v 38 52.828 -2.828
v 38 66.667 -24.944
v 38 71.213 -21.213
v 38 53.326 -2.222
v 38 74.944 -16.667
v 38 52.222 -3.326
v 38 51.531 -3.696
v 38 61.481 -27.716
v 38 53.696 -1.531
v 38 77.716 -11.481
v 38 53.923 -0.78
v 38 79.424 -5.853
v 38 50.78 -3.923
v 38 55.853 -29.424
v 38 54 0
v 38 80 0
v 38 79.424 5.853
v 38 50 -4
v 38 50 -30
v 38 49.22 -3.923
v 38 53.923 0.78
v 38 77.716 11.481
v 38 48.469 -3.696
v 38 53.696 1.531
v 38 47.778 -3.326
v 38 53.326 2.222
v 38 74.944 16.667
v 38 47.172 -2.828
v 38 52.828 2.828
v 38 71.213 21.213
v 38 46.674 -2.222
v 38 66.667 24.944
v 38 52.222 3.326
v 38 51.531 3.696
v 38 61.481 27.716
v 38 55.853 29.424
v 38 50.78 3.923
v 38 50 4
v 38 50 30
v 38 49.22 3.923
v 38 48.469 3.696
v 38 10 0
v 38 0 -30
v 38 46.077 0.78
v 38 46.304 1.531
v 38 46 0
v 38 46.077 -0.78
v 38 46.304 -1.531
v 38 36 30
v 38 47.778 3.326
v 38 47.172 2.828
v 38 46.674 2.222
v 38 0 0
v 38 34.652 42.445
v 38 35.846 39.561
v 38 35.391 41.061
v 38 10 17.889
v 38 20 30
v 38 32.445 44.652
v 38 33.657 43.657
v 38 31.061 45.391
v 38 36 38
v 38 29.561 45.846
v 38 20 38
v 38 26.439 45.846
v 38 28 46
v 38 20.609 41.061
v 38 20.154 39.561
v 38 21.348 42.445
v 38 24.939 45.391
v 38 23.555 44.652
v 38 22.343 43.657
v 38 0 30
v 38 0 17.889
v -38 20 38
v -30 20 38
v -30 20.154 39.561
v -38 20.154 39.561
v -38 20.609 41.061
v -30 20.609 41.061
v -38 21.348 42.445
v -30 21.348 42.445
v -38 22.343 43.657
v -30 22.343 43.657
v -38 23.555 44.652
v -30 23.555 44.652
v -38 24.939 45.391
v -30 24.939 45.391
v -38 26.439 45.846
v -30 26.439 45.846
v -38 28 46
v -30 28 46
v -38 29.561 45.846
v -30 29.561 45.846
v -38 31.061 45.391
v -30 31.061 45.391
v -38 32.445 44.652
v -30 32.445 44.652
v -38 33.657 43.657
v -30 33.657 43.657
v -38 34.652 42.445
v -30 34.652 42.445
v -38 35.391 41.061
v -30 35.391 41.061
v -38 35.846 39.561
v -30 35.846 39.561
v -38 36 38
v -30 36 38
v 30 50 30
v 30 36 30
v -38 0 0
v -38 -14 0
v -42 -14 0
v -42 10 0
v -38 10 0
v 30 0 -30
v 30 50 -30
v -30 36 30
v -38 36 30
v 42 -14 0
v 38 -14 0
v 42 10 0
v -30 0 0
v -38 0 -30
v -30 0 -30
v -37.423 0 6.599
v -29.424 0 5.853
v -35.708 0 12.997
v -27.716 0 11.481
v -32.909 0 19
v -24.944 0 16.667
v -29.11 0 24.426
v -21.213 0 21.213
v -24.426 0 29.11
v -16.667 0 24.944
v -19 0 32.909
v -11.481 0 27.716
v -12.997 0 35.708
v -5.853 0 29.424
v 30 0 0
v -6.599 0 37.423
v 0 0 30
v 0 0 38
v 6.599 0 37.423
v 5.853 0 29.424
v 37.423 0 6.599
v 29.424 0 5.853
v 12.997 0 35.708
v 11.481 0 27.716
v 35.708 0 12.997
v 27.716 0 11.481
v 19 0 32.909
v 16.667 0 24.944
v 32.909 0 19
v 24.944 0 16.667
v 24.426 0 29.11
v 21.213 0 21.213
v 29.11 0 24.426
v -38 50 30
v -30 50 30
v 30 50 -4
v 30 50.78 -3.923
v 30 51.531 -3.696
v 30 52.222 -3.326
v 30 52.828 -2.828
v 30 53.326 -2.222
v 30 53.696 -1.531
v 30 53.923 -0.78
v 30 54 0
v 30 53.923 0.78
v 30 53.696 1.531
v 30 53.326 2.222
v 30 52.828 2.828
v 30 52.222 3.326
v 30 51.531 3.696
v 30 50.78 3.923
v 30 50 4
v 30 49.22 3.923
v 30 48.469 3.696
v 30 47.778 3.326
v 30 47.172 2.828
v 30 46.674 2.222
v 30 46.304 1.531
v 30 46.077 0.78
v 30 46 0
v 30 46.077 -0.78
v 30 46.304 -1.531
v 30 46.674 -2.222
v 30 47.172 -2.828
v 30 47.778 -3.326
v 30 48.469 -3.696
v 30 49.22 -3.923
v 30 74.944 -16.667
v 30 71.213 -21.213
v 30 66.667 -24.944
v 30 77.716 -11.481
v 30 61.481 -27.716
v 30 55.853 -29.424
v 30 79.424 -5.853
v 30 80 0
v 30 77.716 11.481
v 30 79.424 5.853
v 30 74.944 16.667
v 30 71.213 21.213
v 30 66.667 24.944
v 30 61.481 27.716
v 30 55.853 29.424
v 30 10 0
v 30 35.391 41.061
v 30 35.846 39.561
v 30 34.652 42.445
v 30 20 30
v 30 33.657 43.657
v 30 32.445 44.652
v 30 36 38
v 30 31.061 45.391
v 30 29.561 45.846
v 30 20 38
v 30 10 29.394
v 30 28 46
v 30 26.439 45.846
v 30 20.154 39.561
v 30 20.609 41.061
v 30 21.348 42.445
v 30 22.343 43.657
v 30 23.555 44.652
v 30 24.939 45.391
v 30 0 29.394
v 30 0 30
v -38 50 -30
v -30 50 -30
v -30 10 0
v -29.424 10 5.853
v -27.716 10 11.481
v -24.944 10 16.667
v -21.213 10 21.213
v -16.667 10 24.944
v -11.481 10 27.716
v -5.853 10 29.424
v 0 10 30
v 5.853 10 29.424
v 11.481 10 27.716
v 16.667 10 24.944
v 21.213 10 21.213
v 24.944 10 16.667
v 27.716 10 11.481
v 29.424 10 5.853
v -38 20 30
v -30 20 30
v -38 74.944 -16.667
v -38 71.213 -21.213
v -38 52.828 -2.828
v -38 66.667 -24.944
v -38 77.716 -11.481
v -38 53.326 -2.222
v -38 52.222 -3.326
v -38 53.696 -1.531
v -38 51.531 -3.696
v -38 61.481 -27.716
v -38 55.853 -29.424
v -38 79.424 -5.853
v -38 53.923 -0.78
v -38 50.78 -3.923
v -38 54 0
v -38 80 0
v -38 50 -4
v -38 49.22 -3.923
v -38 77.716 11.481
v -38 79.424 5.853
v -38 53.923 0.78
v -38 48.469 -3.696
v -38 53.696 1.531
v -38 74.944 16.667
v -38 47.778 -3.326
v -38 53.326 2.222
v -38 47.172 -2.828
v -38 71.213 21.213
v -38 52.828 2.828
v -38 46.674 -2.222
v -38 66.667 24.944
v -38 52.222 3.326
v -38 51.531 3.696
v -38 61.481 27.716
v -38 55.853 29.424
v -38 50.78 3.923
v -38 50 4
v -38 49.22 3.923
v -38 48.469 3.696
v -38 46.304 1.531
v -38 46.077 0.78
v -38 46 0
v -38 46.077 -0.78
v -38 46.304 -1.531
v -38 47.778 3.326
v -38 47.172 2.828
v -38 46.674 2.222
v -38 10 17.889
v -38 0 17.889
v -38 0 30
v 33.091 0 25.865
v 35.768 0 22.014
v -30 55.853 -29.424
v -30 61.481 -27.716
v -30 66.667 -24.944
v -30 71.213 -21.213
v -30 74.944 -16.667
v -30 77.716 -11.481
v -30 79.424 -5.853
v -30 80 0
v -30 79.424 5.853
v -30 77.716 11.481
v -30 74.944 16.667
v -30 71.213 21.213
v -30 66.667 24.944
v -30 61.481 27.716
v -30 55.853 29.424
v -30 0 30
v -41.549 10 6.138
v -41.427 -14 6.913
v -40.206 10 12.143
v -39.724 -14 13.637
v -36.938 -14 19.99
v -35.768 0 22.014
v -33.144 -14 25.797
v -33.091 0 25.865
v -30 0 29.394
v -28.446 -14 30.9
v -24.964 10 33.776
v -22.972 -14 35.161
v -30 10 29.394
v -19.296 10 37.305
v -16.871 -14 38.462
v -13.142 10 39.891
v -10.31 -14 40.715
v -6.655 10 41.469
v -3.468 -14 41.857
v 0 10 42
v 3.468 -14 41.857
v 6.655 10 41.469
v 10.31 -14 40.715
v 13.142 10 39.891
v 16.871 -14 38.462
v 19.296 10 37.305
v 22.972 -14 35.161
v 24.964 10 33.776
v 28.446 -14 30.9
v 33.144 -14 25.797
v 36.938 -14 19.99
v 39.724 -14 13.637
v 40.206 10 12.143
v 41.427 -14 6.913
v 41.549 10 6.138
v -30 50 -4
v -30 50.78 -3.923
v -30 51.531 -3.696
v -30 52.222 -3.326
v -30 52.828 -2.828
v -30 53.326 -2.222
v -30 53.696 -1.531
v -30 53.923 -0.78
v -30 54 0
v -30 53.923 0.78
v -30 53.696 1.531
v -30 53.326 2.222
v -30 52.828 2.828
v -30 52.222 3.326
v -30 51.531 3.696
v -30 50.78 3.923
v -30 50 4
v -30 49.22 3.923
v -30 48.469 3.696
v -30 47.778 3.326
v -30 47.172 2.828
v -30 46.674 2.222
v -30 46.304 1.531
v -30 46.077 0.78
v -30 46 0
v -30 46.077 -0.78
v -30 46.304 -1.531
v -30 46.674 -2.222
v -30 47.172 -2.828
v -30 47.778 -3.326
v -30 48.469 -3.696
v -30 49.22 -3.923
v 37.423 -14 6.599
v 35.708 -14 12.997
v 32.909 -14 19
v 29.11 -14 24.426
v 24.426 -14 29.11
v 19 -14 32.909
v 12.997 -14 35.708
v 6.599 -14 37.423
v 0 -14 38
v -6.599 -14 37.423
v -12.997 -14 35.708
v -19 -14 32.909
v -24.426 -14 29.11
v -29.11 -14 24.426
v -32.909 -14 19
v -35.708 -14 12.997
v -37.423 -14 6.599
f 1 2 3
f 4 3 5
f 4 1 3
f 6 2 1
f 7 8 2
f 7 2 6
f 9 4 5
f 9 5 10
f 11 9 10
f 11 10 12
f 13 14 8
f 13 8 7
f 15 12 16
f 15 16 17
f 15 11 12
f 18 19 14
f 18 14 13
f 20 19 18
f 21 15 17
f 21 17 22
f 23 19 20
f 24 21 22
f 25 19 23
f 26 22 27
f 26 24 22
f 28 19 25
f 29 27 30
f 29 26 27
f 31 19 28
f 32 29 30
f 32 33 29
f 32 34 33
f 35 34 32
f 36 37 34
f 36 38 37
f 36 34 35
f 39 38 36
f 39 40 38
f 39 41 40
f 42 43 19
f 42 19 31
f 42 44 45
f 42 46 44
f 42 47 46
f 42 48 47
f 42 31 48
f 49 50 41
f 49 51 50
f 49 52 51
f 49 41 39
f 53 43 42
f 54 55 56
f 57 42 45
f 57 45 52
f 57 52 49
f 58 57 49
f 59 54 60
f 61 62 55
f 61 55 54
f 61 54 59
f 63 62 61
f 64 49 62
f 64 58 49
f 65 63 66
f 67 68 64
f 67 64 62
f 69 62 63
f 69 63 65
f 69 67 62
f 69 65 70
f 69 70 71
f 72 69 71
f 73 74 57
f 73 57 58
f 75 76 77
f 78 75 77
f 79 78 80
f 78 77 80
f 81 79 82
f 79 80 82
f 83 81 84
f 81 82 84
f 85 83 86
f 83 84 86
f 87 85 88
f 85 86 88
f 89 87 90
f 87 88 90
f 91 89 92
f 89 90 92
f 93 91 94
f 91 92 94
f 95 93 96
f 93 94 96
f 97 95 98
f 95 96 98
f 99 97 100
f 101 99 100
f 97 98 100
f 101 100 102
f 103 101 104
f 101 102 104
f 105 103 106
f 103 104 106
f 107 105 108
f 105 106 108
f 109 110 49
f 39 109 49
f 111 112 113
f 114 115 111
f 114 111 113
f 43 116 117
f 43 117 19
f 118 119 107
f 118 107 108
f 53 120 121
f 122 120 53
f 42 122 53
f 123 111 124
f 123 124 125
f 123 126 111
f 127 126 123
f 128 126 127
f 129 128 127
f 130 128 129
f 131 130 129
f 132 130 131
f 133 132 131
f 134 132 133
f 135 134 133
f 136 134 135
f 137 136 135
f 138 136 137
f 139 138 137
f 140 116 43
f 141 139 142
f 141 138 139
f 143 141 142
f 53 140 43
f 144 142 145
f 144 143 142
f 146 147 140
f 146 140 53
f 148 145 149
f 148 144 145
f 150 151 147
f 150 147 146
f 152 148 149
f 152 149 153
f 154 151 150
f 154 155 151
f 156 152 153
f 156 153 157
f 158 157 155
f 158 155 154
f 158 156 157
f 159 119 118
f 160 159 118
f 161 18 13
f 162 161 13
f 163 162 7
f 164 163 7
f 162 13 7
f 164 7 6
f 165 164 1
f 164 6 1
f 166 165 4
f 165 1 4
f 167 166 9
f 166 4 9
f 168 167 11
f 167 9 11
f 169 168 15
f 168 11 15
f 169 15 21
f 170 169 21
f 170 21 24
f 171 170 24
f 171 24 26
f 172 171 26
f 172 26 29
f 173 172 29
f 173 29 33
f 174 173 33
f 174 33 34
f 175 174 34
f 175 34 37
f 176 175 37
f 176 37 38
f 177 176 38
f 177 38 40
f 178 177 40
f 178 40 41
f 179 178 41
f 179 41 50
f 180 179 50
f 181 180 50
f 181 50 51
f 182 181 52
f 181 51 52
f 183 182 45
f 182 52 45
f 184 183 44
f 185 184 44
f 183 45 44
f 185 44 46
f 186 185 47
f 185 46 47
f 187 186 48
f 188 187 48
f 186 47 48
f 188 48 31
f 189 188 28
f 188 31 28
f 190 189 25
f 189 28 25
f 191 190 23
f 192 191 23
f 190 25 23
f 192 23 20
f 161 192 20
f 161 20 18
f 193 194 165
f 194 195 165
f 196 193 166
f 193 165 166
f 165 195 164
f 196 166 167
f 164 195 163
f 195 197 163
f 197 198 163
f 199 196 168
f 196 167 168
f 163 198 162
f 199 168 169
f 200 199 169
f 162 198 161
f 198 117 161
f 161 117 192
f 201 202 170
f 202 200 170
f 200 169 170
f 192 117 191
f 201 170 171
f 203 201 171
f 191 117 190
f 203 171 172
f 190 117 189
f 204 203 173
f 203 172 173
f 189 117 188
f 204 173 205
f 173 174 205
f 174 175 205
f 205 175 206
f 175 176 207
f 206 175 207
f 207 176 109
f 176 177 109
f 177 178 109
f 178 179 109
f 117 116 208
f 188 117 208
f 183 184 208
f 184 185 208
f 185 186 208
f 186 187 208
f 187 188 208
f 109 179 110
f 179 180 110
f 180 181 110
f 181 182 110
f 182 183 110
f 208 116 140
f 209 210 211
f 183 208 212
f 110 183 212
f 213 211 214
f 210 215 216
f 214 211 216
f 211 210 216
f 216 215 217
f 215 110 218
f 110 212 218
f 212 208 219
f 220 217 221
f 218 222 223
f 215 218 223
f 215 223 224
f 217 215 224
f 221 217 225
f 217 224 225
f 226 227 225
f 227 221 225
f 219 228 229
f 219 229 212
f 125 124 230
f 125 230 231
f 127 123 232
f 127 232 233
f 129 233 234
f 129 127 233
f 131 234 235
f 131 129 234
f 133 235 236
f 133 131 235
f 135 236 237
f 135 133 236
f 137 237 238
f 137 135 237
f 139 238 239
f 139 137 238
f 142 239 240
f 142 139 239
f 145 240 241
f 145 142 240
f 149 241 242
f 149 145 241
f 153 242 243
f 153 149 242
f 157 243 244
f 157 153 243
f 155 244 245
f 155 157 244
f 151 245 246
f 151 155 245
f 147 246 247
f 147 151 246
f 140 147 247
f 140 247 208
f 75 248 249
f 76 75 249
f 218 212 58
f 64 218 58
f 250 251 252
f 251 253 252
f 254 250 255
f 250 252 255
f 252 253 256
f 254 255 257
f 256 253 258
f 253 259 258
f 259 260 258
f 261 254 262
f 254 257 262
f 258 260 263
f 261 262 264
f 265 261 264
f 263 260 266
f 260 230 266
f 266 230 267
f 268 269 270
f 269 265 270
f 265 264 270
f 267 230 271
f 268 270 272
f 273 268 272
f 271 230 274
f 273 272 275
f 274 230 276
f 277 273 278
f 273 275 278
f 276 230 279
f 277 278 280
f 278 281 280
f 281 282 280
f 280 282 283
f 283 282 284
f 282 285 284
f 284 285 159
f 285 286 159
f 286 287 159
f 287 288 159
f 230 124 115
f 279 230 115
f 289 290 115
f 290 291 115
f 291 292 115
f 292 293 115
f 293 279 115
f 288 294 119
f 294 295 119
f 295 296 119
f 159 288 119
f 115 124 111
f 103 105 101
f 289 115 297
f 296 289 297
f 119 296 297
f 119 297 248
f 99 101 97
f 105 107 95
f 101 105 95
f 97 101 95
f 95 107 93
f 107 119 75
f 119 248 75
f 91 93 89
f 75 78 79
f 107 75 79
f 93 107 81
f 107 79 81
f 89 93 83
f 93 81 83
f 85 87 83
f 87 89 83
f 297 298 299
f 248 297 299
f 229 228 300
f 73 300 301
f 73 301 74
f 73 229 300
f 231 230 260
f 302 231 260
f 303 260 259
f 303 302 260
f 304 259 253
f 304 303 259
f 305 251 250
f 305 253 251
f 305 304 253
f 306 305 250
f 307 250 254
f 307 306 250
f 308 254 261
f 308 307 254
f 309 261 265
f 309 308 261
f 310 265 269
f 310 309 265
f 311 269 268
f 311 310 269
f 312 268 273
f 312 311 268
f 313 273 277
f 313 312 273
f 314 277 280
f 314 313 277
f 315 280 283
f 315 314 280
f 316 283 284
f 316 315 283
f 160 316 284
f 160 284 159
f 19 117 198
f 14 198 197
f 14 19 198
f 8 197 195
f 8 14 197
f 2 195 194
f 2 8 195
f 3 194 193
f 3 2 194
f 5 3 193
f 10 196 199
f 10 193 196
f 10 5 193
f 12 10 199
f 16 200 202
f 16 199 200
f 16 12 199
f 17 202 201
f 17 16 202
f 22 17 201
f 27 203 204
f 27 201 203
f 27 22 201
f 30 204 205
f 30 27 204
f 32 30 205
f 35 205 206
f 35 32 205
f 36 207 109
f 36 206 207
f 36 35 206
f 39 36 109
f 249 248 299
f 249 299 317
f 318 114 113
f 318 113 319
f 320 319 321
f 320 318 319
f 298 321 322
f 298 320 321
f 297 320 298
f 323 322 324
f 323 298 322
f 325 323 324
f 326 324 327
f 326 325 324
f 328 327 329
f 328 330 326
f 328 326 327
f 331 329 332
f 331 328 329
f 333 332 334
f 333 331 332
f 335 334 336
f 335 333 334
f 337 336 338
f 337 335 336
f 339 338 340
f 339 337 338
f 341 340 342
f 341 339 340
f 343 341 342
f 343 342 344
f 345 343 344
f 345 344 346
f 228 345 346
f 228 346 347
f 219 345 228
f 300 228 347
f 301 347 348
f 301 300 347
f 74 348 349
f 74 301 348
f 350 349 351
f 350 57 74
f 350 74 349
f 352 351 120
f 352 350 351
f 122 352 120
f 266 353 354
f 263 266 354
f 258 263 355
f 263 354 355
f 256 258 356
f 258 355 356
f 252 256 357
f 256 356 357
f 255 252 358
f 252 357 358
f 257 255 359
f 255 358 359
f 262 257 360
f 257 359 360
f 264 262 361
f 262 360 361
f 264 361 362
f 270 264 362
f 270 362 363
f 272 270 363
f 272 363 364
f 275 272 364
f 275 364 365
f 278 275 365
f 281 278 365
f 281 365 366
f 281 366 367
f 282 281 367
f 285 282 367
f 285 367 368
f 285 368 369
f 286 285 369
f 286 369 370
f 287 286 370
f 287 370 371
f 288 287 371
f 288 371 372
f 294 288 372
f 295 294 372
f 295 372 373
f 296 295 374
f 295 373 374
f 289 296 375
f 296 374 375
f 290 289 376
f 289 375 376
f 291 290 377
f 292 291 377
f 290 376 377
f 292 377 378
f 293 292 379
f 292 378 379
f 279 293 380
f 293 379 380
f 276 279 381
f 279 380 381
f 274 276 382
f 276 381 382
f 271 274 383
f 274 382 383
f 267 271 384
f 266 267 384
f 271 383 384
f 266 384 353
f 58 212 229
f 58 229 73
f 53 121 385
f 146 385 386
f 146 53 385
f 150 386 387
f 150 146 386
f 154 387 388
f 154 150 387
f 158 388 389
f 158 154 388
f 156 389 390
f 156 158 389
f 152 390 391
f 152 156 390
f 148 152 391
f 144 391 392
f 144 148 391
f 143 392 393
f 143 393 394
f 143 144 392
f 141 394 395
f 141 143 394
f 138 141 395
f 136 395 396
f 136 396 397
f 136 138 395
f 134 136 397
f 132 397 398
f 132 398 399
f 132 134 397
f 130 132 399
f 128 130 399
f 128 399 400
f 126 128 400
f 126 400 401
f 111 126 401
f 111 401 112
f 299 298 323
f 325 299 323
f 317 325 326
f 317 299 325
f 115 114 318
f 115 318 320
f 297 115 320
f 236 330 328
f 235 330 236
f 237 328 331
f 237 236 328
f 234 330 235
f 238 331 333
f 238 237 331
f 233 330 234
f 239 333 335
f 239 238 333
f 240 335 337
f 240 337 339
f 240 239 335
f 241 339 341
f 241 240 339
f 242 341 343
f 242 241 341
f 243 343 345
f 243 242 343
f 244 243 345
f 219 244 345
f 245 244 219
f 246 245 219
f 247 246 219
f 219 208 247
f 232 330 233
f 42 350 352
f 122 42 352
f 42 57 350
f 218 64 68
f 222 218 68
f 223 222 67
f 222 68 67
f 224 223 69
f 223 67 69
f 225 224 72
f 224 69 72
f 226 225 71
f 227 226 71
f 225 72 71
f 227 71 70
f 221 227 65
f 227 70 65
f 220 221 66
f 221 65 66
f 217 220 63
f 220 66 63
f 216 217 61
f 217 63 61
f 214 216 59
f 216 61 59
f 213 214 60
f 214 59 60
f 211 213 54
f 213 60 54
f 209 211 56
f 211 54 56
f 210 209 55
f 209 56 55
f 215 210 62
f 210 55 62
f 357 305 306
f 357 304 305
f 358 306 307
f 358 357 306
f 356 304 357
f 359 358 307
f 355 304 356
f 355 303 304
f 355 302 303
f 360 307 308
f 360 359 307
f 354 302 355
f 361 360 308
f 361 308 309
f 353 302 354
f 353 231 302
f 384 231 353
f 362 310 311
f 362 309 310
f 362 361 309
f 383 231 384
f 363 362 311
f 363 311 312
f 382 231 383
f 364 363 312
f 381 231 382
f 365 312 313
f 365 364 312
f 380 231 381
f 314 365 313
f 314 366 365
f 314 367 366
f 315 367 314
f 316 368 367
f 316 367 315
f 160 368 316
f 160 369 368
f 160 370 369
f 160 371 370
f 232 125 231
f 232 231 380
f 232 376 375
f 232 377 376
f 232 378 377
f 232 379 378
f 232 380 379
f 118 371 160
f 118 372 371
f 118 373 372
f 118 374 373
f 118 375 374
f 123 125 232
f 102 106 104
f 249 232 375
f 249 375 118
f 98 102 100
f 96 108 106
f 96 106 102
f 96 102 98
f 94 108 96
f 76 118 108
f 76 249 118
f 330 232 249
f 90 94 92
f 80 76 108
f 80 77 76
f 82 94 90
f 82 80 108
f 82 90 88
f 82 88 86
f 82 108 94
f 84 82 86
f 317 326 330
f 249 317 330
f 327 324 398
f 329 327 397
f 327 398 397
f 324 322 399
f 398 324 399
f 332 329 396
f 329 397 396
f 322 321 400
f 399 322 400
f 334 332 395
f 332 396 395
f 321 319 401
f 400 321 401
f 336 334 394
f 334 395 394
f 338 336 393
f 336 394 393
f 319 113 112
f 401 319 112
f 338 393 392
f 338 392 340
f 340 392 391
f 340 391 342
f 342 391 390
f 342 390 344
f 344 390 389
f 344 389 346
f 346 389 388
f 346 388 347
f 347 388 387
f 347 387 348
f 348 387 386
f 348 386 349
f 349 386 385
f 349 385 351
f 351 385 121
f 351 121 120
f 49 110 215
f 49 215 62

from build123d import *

# Parameters (mm, degrees)
SKETCH_1_R          = 38
SKETCH_1_R_2        = 30
EXTRUDE_1_DEPTH     = 10
SKETCH_2_W          = 8
SKETCH_2_H          = 60
EXTRUDE_2_DEPTH     = 80
SKETCH_3_R          = 4
CUT_EXTRUDE_1_DEPTH = 80
SKETCH_4_W          = 60
SKETCH_4_H          = 40.678120155
CUT_EXTRUDE_2_DEPTH = 81
EXTRUDE_3_DEPTH     = 24
SKETCH_7_W          = 8
SKETCH_7_H          = 16
EXTRUDE_5_DEPTH     = 16
CUT_EXTRUDE_3_DEPTH = 81


with BuildPart() as part:
    # 草图1 → 凸台-拉伸1 (new body)
    with BuildSketch(Plane(origin=(0, 0, 0), x_dir=(1, 0, 0), z_dir=(0, 1, 0))):
        Circle(SKETCH_1_R)
        Circle(SKETCH_1_R_2, mode=Mode.SUBTRACT)
    extrude(amount=EXTRUDE_1_DEPTH)

    # 草图2 → 凸台-拉伸2 (add)
    with BuildSketch(Plane.XZ):
        with Locations((-34, 0)):
            Rectangle(SKETCH_2_W, SKETCH_2_H)
        with Locations((34, 0)):
            Rectangle(SKETCH_2_W, SKETCH_2_H)
    extrude(amount=-EXTRUDE_2_DEPTH)

    # 草图3 → 切除-拉伸1 (cut)
    with BuildSketch(Plane(origin=(38, 0, 0), x_dir=(0, 0, -1), z_dir=(1, 0, 0))):
        with Locations((0, 50)):
            Circle(SKETCH_3_R)
        with BuildLine():
            Line((-30, 50), (-30, 88))
            Line((-30, 88), (30, 88))
            Line((30, 88), (30, 50))
            ThreePointArc((30, 50), (0, 80), (-30, 50))
        make_face()
    extrude(amount=-CUT_EXTRUDE_1_DEPTH, mode=Mode.SUBTRACT)

    # 草图4 → 切除-拉伸2 (cut, through all)
    with BuildSketch(Plane.XZ):
        with Locations((0, -20.339060078)):
            Rectangle(SKETCH_4_W, SKETCH_4_H)
    extrude(amount=-CUT_EXTRUDE_2_DEPTH, mode=Mode.SUBTRACT)

    # 草图5 → 凸台-拉伸3 (add)
    with BuildSketch(Plane(origin=(0, 10, 0), x_dir=(1, 0, 0), z_dir=(0, 1, 0))):
        with BuildLine():
            Line((42, 0), (38, 0))
            ThreePointArc((38, 0), (0, -38), (-38, 0))
            Line((-38, 0), (-42, 0))
            ThreePointArc((-42, 0), (0, -42), (42, 0))
        make_face()
    extrude(amount=-EXTRUDE_3_DEPTH)

    # 草图7 → 凸台-拉伸5 (add)
    with BuildSketch(Plane.XY.offset(30)):
        with Locations((-34, 28)):
            Rectangle(SKETCH_7_W, SKETCH_7_H)
        with Locations((34, 28)):
            Rectangle(SKETCH_7_W, SKETCH_7_H)
    extrude(amount=EXTRUDE_5_DEPTH)

    # 草图8 → 切除-拉伸3 (cut, through all)
    with BuildSketch(Plane(origin=(38, 0, 0), x_dir=(0, 0, -1), z_dir=(1, 0, 0))):
        with BuildLine():
            Line((-38, 36), (-49.79015057, 36))
            Line((-49.79015057, 36), (-49.79015057, 20))
            Line((-49.79015057, 20), (-38, 20))
            ThreePointArc((-38, 20), (-46, 28), (-38, 36))
        make_face()
    extrude(amount=-CUT_EXTRUDE_3_DEPTH, mode=Mode.SUBTRACT)


solid = part.part
